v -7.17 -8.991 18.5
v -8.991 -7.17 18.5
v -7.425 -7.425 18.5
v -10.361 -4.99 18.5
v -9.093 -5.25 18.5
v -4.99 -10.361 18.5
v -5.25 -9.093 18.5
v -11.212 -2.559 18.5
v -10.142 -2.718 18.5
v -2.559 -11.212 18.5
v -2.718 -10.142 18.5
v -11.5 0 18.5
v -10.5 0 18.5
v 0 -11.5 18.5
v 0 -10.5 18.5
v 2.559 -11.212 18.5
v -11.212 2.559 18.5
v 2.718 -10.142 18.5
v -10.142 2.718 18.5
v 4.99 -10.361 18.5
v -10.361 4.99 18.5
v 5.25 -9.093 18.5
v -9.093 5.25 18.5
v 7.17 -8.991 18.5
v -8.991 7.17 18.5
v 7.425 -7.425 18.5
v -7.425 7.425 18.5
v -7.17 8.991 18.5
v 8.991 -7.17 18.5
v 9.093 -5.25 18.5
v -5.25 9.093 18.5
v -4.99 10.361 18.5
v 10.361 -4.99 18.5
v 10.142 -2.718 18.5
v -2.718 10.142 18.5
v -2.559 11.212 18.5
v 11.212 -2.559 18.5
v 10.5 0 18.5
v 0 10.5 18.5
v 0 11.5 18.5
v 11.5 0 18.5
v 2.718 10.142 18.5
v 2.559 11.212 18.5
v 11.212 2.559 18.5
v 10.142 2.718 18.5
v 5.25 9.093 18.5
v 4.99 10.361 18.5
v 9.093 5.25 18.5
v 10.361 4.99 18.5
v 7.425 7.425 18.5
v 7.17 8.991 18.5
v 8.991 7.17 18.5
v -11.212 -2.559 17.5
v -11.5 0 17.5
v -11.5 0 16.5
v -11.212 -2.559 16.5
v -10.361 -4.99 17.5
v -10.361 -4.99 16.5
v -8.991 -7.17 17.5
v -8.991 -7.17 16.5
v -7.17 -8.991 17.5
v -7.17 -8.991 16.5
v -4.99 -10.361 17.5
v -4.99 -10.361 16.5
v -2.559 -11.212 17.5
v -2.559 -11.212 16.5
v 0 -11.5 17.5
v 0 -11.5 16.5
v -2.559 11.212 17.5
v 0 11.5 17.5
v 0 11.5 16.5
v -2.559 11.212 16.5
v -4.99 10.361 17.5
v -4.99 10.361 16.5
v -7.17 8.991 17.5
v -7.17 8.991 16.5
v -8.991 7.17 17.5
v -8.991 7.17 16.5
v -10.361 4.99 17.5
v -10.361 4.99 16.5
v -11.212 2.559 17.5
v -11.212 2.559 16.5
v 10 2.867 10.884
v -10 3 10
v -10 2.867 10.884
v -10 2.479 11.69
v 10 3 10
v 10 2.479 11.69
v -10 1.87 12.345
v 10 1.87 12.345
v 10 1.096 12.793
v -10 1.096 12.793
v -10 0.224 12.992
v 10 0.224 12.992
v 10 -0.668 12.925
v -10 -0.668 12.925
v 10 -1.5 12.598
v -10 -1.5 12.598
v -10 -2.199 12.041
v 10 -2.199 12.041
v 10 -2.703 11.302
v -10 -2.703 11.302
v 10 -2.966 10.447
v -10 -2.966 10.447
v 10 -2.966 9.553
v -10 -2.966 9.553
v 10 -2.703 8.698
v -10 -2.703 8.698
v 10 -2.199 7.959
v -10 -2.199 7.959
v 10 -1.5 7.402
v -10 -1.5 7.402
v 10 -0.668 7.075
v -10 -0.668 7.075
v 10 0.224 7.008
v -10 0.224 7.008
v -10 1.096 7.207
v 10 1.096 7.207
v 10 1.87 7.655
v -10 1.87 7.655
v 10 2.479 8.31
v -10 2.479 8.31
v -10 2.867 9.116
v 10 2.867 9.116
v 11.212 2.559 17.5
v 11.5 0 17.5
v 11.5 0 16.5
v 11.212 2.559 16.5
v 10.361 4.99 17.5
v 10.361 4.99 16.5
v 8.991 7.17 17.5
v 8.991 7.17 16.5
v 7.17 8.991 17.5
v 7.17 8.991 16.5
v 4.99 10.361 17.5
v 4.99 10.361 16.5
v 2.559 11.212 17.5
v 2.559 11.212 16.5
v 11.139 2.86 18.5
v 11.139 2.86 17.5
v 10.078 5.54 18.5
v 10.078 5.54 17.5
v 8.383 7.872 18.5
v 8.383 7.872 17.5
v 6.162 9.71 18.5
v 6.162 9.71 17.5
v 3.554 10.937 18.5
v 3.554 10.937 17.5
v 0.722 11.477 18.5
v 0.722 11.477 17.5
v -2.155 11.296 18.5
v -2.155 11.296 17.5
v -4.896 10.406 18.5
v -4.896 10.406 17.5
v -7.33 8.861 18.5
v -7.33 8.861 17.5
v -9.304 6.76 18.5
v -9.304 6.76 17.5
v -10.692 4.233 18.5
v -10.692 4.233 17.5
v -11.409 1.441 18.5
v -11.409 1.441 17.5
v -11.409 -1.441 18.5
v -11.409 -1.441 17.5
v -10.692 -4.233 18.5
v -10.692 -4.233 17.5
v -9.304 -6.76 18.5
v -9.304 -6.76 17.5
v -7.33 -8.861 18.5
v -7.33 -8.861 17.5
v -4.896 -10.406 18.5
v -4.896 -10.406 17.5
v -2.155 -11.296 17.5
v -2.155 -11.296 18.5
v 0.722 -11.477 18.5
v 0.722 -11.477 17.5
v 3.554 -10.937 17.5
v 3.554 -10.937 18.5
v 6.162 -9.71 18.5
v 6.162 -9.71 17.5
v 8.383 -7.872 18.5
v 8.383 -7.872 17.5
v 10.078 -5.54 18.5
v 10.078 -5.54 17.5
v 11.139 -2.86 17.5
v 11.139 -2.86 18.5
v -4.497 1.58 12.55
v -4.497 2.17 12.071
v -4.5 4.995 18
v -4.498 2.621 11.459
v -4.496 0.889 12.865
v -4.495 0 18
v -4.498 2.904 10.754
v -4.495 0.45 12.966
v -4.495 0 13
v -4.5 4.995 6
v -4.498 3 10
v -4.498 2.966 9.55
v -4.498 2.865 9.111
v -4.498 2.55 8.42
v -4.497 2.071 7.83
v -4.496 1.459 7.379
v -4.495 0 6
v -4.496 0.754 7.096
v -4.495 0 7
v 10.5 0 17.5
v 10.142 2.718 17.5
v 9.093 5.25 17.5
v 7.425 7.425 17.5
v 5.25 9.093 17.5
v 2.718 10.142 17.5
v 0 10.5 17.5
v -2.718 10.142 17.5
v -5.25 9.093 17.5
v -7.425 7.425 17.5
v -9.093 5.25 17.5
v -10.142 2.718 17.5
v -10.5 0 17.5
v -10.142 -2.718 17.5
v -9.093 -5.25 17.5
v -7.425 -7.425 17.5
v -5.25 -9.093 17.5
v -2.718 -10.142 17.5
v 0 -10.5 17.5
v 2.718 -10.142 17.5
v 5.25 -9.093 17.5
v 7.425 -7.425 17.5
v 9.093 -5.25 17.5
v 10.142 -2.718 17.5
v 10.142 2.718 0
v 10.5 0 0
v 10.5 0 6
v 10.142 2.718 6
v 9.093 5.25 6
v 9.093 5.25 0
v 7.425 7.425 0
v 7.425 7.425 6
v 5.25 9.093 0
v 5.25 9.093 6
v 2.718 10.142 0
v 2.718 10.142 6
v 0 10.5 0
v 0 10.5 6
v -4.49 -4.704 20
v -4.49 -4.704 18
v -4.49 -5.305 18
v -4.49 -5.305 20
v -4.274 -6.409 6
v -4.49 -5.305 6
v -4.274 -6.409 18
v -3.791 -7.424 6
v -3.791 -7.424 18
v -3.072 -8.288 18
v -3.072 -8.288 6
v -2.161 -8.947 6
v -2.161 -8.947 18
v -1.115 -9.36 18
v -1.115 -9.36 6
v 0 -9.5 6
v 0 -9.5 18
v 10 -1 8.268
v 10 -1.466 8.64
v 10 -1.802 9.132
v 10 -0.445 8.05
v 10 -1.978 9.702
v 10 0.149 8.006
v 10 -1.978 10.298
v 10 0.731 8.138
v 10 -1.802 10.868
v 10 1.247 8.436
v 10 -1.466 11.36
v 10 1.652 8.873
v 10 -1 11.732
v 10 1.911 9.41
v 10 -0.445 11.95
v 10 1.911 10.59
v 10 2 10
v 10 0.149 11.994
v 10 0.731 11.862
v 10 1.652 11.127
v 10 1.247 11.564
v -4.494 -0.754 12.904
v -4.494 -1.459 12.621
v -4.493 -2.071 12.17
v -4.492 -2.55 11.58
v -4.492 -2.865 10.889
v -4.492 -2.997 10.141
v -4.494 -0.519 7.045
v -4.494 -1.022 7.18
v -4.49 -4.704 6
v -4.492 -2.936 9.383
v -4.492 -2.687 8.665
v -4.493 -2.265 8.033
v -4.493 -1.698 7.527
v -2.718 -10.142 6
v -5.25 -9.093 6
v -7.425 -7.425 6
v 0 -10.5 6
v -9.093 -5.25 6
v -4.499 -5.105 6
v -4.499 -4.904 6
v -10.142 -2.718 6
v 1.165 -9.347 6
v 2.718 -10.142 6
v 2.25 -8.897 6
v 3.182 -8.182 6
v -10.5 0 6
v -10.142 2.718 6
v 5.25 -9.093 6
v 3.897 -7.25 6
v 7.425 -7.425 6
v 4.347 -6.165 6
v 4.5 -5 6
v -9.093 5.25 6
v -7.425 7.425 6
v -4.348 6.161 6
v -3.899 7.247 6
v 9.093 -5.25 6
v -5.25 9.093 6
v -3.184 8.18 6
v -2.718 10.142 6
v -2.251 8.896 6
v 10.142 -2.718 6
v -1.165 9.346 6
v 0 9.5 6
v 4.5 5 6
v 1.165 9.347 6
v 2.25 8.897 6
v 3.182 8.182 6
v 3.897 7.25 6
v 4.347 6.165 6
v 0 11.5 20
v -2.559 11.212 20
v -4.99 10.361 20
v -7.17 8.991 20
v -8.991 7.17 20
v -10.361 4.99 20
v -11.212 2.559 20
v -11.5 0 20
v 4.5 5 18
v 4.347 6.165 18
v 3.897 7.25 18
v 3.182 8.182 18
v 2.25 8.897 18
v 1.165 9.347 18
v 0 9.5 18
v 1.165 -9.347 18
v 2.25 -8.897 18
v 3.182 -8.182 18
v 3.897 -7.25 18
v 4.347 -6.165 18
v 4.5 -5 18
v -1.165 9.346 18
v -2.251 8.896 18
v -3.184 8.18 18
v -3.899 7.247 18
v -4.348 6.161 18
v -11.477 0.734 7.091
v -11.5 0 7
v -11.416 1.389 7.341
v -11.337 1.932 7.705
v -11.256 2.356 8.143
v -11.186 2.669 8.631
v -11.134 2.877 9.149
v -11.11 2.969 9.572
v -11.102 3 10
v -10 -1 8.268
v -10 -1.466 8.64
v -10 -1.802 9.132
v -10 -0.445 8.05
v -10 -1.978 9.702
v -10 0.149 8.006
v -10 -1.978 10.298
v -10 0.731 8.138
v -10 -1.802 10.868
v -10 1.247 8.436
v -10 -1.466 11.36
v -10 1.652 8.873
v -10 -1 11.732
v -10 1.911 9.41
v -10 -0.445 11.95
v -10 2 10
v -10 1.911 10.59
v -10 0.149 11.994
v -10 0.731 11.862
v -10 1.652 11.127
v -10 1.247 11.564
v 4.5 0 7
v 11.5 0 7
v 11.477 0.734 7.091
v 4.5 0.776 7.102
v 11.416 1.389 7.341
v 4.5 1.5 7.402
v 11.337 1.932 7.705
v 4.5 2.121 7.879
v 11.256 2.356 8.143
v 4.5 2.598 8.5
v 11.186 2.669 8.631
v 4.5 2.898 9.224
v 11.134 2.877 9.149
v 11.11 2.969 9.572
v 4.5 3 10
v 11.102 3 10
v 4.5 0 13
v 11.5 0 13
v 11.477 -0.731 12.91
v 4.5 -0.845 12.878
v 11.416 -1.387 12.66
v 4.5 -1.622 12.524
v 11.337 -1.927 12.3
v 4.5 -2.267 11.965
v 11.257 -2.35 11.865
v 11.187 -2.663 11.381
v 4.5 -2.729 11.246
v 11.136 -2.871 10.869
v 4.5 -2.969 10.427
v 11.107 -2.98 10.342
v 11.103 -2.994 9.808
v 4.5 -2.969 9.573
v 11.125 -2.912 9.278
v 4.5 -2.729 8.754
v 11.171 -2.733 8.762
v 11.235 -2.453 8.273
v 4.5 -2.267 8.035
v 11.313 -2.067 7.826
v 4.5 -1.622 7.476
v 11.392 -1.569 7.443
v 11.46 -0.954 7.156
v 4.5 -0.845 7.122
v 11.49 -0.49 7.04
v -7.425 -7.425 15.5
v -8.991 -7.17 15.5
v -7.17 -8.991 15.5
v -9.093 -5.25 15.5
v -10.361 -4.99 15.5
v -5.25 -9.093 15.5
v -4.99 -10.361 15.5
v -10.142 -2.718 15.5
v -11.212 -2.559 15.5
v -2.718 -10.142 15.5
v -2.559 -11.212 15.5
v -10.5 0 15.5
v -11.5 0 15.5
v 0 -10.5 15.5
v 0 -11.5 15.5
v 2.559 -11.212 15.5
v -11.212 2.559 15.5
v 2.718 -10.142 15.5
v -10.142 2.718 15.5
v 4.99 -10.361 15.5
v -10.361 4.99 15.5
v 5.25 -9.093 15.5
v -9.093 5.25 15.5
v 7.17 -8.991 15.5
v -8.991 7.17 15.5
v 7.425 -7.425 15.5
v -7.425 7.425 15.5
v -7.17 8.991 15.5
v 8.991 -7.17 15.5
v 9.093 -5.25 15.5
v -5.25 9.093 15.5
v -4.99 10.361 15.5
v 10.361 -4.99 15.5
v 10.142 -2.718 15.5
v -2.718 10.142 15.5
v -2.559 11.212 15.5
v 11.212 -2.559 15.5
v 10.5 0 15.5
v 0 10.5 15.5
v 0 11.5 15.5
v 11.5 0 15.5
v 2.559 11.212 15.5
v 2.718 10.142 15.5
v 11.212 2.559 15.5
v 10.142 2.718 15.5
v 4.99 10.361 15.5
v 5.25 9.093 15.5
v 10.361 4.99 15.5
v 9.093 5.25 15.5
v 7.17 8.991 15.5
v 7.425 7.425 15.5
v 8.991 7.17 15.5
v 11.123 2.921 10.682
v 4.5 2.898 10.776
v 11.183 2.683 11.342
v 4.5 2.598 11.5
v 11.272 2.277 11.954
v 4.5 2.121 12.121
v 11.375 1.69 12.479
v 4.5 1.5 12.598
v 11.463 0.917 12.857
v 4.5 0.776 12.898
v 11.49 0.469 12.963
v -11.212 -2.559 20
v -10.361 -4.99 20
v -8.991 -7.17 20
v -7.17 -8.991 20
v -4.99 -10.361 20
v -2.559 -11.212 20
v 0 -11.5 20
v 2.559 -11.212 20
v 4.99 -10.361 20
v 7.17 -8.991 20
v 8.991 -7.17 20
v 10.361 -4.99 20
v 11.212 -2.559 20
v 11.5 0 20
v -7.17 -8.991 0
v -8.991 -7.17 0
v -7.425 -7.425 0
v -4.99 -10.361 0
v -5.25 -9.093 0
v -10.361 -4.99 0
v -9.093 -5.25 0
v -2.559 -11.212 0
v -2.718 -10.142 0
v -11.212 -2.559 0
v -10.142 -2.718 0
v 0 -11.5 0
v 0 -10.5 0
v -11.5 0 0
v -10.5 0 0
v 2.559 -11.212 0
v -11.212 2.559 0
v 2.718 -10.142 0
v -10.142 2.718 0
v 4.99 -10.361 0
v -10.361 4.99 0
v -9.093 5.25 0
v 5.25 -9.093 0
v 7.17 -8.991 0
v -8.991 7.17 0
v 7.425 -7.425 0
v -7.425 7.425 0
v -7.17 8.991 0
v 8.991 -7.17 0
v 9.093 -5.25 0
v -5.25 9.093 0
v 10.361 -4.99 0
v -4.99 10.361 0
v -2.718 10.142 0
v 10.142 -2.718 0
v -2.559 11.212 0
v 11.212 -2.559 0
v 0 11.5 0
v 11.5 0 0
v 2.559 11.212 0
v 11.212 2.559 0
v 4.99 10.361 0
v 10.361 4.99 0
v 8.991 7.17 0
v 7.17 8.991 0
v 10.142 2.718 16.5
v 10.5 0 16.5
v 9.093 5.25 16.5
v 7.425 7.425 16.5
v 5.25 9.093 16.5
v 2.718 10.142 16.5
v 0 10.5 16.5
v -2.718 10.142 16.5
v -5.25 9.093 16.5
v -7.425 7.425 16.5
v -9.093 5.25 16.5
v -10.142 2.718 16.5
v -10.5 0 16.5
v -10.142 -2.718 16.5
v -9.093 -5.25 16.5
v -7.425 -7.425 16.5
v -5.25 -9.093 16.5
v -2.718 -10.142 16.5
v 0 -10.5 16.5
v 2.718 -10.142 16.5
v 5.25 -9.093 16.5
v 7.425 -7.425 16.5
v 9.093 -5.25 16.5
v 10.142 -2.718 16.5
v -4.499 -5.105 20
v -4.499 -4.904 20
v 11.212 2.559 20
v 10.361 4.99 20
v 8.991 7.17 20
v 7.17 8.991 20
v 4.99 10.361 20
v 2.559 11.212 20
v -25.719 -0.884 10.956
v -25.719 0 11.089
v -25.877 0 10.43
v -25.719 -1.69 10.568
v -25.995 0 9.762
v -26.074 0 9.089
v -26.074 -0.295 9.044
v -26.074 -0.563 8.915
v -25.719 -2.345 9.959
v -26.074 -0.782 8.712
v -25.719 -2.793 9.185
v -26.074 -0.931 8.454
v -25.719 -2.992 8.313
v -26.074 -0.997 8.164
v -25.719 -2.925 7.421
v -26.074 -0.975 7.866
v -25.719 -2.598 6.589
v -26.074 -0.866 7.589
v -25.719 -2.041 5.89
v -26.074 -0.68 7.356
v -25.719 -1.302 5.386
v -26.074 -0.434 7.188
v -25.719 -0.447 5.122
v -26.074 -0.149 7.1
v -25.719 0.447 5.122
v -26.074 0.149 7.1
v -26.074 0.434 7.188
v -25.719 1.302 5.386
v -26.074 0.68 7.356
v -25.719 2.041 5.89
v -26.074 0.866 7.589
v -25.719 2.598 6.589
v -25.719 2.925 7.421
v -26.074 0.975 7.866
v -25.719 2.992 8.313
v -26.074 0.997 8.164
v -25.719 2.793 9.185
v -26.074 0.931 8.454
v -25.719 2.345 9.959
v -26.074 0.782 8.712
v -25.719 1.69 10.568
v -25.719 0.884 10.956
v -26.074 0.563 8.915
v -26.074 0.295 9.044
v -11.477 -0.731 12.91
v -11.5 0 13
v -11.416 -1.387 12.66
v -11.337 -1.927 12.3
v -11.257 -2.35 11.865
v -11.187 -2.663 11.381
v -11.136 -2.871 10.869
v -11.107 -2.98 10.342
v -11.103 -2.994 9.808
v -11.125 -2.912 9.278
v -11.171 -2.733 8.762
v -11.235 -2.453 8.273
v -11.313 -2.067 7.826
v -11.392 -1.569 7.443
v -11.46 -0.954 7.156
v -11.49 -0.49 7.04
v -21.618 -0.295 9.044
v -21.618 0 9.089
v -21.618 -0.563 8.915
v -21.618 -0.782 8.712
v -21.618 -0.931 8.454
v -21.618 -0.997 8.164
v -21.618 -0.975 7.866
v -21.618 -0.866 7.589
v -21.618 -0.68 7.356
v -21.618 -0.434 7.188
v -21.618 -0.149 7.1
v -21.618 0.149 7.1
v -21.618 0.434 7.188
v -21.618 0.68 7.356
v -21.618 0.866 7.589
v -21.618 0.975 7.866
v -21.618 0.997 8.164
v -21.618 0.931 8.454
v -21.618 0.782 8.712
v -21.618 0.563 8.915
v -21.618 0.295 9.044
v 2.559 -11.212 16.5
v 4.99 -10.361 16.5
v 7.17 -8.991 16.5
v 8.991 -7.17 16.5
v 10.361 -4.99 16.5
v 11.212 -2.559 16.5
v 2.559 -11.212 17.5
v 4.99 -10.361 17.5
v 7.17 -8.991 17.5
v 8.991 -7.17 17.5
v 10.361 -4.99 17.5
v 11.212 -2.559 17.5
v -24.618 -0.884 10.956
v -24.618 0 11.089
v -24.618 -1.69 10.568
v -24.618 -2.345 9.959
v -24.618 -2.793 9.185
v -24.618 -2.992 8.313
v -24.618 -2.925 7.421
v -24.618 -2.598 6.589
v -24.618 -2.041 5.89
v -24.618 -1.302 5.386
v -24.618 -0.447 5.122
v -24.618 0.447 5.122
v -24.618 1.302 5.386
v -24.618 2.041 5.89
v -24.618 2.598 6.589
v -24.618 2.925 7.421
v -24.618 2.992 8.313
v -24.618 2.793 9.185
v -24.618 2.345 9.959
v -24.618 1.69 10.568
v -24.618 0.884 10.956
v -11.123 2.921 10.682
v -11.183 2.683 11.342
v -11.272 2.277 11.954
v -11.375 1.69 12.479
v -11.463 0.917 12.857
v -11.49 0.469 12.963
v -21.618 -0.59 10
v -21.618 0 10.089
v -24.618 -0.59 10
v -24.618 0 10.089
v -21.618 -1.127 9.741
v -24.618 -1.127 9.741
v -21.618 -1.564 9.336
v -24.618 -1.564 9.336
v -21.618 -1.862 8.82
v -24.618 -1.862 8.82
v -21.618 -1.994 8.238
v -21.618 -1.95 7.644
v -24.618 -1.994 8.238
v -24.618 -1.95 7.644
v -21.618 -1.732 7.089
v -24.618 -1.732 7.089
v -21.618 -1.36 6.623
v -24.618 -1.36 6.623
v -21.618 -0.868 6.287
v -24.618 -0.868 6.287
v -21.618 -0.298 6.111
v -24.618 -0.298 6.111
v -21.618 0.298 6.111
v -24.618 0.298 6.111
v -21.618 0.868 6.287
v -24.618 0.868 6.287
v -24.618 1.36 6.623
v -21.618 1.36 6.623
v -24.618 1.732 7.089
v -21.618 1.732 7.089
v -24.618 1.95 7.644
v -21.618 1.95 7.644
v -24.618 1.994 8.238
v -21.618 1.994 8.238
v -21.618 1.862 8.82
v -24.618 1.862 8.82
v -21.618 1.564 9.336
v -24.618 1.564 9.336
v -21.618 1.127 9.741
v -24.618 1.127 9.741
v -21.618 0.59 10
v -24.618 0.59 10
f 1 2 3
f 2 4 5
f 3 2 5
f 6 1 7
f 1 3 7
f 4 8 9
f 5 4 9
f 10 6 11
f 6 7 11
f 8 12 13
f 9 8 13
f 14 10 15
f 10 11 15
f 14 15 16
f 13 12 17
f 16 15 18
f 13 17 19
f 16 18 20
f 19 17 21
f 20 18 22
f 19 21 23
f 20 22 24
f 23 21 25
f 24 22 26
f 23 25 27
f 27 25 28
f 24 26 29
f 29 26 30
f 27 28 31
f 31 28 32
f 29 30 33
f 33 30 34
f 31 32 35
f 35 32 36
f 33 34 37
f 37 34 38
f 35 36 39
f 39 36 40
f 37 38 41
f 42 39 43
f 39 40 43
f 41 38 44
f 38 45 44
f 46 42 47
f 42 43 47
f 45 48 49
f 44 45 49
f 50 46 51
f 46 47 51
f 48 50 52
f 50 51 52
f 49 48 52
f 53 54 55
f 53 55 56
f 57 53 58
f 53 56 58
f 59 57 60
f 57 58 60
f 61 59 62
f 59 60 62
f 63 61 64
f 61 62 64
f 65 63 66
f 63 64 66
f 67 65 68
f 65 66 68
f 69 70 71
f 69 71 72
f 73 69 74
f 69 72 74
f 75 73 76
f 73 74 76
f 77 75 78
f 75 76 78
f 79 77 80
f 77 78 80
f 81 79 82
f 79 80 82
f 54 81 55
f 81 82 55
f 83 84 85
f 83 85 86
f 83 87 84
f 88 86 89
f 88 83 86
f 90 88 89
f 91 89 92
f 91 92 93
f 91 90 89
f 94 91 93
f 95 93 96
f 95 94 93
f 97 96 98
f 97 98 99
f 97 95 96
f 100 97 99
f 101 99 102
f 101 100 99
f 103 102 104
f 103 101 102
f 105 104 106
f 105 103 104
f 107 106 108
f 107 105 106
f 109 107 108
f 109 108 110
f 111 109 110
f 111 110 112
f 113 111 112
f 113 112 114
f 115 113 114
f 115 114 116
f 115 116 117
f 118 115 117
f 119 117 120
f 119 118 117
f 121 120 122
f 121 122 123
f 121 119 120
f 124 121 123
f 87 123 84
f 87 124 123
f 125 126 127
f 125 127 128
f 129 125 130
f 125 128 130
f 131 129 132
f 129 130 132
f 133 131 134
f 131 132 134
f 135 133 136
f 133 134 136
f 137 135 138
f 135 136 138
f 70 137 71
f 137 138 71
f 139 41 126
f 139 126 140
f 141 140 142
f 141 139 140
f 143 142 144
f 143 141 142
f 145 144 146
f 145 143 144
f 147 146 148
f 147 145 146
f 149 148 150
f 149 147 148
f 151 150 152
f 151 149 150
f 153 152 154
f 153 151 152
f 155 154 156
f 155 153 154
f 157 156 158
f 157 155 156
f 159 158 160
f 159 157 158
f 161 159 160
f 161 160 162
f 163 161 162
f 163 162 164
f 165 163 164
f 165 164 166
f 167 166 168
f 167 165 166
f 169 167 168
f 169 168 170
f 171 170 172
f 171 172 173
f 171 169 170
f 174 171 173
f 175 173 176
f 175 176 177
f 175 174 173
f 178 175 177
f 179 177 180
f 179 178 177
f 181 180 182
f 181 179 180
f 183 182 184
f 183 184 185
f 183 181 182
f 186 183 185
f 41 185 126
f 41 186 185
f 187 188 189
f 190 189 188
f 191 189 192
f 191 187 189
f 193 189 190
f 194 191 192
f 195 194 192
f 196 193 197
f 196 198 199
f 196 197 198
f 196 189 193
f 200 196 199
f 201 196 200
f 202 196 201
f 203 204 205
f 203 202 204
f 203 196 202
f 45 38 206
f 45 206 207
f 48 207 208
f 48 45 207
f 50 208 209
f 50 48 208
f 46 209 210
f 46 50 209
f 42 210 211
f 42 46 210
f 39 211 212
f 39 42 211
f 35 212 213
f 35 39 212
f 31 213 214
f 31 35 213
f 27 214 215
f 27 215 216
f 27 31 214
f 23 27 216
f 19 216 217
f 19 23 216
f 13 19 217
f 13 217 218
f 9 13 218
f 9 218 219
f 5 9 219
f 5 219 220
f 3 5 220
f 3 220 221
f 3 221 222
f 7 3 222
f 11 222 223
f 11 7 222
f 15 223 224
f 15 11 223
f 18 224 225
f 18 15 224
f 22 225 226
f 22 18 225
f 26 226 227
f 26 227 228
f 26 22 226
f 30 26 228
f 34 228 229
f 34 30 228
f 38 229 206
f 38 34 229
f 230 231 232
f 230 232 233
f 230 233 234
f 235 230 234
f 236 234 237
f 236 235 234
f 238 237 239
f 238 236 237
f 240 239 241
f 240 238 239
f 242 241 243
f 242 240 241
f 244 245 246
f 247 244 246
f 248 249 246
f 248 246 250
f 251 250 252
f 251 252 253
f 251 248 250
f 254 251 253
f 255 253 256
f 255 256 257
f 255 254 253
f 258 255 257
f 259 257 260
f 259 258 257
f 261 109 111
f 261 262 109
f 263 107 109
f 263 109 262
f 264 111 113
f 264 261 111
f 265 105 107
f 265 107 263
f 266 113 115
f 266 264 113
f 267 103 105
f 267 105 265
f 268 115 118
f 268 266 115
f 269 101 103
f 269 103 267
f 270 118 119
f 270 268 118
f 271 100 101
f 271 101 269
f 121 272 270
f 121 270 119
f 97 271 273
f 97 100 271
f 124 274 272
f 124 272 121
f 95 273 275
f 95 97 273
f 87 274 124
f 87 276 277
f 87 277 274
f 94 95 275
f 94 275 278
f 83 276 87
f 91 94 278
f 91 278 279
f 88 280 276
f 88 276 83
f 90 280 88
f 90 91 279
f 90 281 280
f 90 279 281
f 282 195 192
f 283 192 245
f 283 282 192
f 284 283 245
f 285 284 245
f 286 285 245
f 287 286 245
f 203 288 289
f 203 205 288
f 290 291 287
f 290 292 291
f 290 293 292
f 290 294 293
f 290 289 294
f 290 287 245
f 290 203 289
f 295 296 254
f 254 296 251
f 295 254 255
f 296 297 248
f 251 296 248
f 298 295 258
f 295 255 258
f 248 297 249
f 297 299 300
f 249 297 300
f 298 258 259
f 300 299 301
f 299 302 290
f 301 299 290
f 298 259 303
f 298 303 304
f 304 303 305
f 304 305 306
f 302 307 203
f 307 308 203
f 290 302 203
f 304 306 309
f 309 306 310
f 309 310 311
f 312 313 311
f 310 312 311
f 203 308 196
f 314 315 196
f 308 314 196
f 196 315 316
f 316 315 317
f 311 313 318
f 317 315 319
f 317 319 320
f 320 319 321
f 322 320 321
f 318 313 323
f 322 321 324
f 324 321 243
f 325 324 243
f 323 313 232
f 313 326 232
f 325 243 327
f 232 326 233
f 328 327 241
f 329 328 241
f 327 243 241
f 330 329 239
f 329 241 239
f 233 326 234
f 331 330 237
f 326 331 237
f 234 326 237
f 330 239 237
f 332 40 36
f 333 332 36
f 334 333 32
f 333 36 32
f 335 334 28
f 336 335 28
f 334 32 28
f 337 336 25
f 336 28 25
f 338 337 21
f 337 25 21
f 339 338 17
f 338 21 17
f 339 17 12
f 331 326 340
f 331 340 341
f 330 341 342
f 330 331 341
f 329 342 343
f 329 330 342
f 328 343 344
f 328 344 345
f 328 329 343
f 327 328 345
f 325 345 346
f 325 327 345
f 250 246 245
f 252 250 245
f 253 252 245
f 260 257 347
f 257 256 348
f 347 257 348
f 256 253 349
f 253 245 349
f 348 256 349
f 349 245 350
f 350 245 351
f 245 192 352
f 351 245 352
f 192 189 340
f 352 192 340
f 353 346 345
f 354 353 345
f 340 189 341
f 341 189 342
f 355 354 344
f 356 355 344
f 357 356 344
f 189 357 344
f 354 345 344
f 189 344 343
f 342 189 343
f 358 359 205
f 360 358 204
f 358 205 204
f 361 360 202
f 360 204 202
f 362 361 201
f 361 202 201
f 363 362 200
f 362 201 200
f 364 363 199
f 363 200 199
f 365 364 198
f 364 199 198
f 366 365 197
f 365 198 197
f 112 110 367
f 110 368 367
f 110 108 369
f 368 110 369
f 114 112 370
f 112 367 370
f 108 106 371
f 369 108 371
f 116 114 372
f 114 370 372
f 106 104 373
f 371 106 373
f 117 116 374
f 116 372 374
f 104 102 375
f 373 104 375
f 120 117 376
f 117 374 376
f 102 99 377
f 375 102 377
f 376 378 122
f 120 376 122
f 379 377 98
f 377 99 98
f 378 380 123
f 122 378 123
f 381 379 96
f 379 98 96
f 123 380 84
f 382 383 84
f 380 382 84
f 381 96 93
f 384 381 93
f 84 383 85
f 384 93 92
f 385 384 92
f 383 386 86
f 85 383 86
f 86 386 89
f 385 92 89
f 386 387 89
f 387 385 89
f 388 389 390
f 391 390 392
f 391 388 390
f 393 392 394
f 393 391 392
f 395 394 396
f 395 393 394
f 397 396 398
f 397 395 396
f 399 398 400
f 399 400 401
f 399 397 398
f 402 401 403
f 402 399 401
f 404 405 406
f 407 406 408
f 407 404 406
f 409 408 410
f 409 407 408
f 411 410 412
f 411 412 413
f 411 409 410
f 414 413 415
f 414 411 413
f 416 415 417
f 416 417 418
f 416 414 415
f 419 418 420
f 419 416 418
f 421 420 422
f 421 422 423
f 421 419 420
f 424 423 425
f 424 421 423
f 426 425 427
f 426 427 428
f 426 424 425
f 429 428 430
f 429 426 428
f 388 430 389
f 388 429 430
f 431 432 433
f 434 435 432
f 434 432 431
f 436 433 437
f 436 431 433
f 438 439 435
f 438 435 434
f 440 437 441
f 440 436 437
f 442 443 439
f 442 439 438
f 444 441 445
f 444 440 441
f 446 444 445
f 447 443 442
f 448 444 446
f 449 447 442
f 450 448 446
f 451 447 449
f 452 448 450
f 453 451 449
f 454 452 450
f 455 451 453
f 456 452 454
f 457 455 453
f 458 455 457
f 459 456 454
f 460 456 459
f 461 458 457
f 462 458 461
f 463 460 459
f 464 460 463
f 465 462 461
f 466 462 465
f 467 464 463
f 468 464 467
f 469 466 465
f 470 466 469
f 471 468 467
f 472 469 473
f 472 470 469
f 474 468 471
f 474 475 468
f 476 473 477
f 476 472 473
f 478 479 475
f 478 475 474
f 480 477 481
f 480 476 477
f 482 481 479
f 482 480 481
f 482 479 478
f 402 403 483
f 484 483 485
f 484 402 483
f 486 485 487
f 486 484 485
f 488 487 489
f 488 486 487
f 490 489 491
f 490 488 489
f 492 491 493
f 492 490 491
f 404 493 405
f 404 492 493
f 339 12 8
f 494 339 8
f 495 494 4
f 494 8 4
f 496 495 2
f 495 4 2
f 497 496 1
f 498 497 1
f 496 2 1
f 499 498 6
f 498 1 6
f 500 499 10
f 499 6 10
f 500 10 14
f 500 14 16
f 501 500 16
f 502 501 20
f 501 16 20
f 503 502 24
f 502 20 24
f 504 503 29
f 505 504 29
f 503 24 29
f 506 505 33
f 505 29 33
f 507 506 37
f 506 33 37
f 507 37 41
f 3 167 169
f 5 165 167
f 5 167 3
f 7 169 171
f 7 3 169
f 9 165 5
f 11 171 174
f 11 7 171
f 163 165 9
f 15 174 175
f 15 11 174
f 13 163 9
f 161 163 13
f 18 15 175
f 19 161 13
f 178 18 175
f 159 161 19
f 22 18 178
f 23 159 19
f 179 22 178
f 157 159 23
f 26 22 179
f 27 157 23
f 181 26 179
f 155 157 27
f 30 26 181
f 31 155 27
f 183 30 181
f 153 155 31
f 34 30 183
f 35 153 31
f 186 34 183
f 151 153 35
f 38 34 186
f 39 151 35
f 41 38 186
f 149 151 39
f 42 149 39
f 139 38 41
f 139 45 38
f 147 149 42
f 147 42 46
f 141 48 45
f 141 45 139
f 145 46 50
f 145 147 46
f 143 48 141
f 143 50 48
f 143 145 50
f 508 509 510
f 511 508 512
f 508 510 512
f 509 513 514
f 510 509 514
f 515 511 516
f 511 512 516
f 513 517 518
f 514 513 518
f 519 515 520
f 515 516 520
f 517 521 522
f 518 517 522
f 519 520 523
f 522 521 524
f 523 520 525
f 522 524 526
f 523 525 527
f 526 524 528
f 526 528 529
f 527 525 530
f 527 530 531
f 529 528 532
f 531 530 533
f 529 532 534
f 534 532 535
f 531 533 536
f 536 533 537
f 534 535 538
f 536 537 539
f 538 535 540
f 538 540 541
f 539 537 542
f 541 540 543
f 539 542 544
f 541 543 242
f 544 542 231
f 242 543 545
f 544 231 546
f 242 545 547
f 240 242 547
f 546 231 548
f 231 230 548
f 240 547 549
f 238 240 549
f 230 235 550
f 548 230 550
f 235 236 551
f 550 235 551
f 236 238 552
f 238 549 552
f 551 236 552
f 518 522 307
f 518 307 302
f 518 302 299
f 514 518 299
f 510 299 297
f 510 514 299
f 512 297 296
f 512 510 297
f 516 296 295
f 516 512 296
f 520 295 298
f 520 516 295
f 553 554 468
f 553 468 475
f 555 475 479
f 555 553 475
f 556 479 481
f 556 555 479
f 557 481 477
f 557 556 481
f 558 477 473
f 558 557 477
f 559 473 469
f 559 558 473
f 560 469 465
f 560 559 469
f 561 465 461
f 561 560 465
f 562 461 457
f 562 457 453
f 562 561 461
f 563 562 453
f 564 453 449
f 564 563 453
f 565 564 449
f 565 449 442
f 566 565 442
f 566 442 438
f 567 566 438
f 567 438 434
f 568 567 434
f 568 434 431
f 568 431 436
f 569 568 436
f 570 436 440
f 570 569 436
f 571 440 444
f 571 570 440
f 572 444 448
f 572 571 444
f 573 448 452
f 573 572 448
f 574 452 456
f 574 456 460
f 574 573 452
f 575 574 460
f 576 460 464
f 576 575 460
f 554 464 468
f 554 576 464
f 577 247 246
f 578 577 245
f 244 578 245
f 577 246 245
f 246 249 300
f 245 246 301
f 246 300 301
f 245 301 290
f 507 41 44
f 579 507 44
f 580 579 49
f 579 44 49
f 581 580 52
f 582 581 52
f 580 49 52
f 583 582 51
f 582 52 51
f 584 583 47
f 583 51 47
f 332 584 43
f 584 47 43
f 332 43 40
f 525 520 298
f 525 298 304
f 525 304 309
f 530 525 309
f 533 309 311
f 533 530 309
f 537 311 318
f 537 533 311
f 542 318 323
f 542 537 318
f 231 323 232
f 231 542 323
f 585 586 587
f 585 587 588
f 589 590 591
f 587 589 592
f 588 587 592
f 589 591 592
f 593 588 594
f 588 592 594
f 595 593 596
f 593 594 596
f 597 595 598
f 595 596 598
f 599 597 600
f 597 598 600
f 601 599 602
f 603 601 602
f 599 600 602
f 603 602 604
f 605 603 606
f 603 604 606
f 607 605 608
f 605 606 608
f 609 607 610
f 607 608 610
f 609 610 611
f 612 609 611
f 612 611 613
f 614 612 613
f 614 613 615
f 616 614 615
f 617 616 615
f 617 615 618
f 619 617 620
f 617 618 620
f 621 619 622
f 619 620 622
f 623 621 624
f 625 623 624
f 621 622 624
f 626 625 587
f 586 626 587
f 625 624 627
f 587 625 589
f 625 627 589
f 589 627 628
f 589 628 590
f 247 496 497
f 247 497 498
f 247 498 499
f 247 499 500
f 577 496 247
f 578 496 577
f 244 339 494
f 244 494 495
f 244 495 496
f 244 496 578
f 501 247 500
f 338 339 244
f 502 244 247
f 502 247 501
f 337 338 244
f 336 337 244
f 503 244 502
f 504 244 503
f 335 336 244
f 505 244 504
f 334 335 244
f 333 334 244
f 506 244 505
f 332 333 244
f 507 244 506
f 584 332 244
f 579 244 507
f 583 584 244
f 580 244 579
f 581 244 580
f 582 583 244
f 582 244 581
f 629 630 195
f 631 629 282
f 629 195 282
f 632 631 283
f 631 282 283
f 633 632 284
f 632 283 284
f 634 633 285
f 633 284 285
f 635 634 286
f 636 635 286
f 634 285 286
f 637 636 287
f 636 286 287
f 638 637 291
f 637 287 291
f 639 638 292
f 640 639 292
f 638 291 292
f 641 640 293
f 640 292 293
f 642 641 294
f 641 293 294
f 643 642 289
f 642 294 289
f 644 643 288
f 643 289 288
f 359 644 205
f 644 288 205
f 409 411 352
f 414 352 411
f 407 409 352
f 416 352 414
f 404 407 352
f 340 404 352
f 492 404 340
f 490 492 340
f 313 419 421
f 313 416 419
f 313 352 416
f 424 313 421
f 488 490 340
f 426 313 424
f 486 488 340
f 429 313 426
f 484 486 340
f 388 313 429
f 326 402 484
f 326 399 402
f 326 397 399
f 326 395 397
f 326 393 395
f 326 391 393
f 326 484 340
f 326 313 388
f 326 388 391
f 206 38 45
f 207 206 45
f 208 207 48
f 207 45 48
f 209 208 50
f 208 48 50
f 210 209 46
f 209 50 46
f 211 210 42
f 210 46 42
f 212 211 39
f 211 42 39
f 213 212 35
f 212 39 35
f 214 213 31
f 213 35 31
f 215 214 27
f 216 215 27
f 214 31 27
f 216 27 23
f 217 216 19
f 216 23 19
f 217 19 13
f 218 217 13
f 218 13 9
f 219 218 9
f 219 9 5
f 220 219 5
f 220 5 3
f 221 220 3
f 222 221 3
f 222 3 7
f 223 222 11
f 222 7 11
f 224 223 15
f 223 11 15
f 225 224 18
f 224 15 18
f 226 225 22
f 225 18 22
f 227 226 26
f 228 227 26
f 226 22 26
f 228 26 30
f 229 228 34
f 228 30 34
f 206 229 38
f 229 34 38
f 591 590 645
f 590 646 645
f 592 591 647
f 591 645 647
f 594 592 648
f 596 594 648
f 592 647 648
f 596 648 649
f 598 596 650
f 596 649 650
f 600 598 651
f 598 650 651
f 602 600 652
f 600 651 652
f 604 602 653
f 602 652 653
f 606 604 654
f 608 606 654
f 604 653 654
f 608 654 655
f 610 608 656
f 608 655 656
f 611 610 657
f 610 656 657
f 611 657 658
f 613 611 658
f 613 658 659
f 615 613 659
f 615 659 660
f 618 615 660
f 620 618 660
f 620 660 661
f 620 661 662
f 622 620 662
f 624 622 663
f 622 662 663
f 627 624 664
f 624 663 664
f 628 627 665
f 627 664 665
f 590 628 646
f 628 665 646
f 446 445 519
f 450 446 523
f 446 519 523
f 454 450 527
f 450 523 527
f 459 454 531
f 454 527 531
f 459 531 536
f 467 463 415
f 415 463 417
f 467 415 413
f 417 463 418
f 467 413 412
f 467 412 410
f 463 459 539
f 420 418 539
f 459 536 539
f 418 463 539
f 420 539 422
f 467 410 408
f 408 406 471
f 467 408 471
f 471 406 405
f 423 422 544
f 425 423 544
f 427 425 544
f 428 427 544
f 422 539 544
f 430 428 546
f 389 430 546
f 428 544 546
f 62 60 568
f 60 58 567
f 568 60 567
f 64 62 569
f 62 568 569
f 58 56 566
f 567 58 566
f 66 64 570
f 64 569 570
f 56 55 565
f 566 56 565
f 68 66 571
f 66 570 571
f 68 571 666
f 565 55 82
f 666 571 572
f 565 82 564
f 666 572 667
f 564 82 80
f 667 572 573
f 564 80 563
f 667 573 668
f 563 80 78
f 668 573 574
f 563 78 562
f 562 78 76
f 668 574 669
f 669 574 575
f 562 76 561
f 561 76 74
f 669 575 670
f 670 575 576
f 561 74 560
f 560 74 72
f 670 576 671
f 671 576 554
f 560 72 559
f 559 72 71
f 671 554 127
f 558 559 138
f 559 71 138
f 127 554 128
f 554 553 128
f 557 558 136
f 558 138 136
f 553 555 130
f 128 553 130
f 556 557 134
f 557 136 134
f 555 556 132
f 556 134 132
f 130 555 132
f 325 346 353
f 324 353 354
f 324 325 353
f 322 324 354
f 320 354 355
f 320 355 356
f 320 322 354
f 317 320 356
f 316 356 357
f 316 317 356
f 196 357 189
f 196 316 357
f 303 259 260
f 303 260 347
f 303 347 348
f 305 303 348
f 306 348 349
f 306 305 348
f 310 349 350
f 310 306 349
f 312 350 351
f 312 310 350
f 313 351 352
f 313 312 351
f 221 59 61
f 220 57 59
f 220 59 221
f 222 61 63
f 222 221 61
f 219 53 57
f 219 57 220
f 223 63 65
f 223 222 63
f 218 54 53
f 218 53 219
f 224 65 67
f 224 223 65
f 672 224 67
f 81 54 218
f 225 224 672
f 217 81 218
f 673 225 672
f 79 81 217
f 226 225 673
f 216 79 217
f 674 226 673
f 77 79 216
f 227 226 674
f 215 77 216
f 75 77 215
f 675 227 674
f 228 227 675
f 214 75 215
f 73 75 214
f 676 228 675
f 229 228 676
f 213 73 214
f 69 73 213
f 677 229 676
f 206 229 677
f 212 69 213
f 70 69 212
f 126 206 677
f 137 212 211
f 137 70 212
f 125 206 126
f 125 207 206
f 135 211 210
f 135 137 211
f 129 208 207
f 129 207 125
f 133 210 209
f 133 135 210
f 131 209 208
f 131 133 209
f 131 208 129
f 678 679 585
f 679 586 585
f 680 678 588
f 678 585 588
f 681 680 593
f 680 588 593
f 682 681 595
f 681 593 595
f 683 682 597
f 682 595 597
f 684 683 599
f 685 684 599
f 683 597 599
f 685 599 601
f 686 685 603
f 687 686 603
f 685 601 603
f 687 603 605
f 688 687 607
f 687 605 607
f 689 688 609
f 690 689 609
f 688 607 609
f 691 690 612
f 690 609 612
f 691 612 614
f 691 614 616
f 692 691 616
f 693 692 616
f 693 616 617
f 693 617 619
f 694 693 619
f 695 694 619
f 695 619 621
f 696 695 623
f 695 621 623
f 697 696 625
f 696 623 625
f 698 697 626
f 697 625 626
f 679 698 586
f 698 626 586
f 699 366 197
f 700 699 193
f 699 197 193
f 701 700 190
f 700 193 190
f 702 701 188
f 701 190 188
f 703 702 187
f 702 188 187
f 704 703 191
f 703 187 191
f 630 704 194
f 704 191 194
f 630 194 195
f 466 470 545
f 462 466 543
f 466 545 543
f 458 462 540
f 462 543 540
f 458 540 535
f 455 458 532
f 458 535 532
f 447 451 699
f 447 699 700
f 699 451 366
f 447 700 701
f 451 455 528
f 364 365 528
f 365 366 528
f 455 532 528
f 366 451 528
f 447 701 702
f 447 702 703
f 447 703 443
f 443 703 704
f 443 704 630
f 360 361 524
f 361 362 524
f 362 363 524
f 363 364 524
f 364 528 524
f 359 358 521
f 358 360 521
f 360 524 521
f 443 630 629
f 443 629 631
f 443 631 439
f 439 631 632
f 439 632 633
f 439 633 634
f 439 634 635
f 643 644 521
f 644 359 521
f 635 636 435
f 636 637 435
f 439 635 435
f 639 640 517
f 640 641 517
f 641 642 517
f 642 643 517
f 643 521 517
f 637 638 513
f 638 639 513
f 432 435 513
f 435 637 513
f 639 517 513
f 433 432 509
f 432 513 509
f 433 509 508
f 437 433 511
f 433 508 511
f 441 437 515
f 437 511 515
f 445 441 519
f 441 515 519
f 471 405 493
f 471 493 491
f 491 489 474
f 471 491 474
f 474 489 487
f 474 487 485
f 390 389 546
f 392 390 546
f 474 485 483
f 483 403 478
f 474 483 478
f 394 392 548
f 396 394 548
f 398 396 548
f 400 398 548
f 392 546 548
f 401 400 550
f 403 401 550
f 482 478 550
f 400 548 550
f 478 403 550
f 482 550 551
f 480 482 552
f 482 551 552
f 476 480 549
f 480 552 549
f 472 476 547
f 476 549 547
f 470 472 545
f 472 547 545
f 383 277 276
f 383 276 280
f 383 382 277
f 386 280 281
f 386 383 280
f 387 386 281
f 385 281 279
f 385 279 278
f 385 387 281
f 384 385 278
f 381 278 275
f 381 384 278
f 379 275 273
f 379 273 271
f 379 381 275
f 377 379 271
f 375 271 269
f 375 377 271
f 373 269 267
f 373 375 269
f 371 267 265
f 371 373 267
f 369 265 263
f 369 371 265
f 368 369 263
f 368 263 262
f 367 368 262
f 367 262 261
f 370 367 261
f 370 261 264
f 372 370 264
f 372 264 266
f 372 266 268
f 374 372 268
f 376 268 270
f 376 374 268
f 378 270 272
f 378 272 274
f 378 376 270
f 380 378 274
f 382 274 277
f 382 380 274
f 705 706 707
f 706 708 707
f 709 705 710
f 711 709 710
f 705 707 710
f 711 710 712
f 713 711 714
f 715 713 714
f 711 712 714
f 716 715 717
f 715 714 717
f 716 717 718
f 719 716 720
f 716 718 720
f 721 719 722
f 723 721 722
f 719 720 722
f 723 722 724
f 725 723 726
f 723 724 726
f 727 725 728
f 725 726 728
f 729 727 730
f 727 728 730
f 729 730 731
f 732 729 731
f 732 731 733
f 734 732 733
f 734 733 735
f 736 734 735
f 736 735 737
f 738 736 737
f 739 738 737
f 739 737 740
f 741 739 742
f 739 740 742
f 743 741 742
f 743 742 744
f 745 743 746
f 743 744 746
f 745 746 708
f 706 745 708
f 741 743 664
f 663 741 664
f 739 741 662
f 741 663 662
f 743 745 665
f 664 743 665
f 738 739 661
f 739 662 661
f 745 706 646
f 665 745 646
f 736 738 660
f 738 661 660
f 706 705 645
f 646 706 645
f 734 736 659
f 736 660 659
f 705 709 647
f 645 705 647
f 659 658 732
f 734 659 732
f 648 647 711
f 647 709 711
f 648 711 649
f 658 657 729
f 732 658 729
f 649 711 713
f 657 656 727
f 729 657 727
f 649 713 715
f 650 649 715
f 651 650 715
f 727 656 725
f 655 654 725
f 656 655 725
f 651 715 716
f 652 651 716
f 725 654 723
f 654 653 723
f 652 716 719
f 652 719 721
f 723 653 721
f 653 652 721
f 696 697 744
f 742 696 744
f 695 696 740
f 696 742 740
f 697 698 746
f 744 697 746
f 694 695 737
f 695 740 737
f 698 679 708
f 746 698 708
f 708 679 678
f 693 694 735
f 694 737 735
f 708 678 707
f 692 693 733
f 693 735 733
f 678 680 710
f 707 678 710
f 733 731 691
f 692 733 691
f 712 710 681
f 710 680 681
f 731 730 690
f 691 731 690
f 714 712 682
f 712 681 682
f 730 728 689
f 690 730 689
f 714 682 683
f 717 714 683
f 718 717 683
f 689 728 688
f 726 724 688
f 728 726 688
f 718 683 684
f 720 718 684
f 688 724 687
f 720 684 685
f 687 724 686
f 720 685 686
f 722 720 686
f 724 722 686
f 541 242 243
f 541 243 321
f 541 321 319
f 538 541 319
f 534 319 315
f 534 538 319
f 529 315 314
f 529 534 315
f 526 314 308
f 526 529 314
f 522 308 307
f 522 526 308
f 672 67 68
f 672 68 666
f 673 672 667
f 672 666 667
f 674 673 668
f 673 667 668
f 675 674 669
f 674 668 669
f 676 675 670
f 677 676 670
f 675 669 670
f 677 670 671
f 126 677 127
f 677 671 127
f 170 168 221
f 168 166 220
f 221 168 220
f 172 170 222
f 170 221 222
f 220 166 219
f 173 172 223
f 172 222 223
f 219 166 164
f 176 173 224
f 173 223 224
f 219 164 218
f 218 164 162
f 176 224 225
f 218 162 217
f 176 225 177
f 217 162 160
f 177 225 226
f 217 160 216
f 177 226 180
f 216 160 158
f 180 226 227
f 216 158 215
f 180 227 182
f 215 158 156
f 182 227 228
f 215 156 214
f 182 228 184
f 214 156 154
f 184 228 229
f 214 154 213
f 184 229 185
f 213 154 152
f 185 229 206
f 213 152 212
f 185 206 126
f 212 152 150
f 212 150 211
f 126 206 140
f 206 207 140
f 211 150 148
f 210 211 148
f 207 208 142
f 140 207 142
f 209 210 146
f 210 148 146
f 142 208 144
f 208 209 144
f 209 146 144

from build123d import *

# Parameters (mm, degrees)
F1_DEPTH  = 20
F2_DEPTH  = 18
F3_DEPTH  = 6
F5_DEPTH  = 12.5
F7_R      = 11.5
F7_R_2    = 10.5
F8_DEPTH  = 1
F10_R     = 11.5
F10_R_2   = 10.5
F11_DEPTH = 1
F12_DEPTH = 1
F13_R     = 3
F13_R_2   = 2
F14_DEPTH = 10


with BuildPart() as f1:
    # F0 (on Top) → F1 (new body)
    with BuildSketch(Plane.XY):
        with BuildLine():
            Line((0, 10.5), (0, 11.5))
            ThreePointArc((0, 11.5), (-8.1317279836, 8.1317279836), (-11.5, 0))
            Line((-11.5, 0), (-10.5, 0))
            ThreePointArc((-10.5, 0), (-7.4246212025, 7.4246212025), (0, 10.5))
        make_face()
        with BuildLine():
            Line((0, 9.5), (0, 10.5))
            ThreePointArc((0, 10.5), (-7.4246212025, 7.4246212025), (-10.5, 0))
            Line((-10.5, 0), (-4.4949756738, 0))
            Line((-4.4949756738, 0), (-4.499997726, 4.9954760621))
            ThreePointArc((-4.499997726, 4.9954760621), (-3.1835795671, 8.1803806596), (0, 9.5))
        make_face()
        with BuildLine():
            Line((-4.4949756738, 0), (0, 0))
            Line((0, 0), (0, 0.5))
            ThreePointArc((0, 0.5), (-3.1803806596, 1.8164204329), (-4.499997726, 4.9954760621))
            Line((-4.499997726, 4.9954760621), (-4.4949756738, 0))
        make_face()
        with BuildLine():
            Line((0, 0.5), (0, 9.5))
            ThreePointArc((0, 9.5), (-3.1835795671, 8.1803806596), (-4.499997726, 4.9954760621))
            ThreePointArc((-4.499997726, 4.9954760621), (-3.1803806596, 1.8164204329), (0, 0.5))
        make_face()
        with BuildLine():
            ThreePointArc((4.5, 5), (3.1819805153, 8.1819805153), (0, 9.5))
            Line((0, 9.5), (0, 0.5))
            ThreePointArc((0, 0.5), (3.1819805153, 1.8180194847), (4.5, 5))
        make_face()
        with BuildLine():
            Line((10.5, 0), (11.5, 0))
            ThreePointArc((11.5, 0), (8.1317279836, 8.1317279836), (0, 11.5))
            Line((0, 11.5), (0, 10.5))
            ThreePointArc((0, 10.5), (7.4246212025, 7.4246212025), (10.5, 0))
        make_face()
        with BuildLine():
            Line((4.5, -5), (4.5, 0))
            Line((4.5, 0), (0, 0))
            Line((0, 0), (0, -0.5))
            ThreePointArc((0, -0.5), (3.1819805153, -1.8180194847), (4.5, -5))
        make_face()
        with BuildLine():
            ThreePointArc((0, -10.5), (7.4246212025, -7.4246212025), (10.5, 0))
            Line((10.5, 0), (4.5, 0))
            Line((4.5, 0), (4.5, -5))
            ThreePointArc((4.5, -5), (3.1819805153, -8.1819805153), (0, -9.5))
            Line((0, -9.5), (0, -10.5))
        make_face()
        with BuildLine():
            ThreePointArc((-11.5, 0), (-8.1317279836, -8.1317279836), (0, -11.5))
            Line((0, -11.5), (0, -10.5))
            ThreePointArc((0, -10.5), (-7.4246212025, -7.4246212025), (-10.5, 0))
            Line((-10.5, 0), (-11.5, 0))
        make_face()
        with BuildLine():
            ThreePointArc((-10.5, 0), (-7.4246212025, -7.4246212025), (0, -10.5))
            Line((0, -10.5), (0, -9.5))
            ThreePointArc((0, -9.5), (-3.0722026892, -8.28809529), (-4.4896423078, -5.3051425051))
            ThreePointArc((-4.4896423078, -5.3051425051), (-4.499997726, -5.0045239379), (-4.4902467638, -4.7038851573))
            Line((-4.4902467638, -4.7038851573), (-4.4949756738, 0))
            Line((-4.4949756738, 0), (-10.5, 0))
        make_face()
        with BuildLine():
            Line((0, -0.5), (0, 0))
            Line((0, 0), (-4.4949756738, 0))
            Line((-4.4949756738, 0), (-4.4902467638, -4.7038851573))
            ThreePointArc((-4.4902467638, -4.7038851573), (-3.0755067231, -1.7149949169), (0, -0.5))
        make_face()
        with BuildLine():
            ThreePointArc((-4.4896423078, -5.3051425051), (-3.0722026892, -8.28809529), (0, -9.5))
            Line((0, -9.5), (0, -0.5))
            ThreePointArc((0, -0.5), (-3.0755067231, -1.7149949169), (-4.4902467638, -4.7038851573))
            Line((-4.4902467638, -4.7038851573), (-4.4896423078, -5.3051425051))
        make_face()
        with BuildLine():
            Line((0, -0.5), (0, -9.5))
            ThreePointArc((0, -9.5), (3.1819805153, -8.1819805153), (4.5, -5))
            ThreePointArc((4.5, -5), (3.1819805153, -1.8180194847), (0, -0.5))
        make_face()
        with BuildLine():
            ThreePointArc((0, -11.5), (8.1317279836, -8.1317279836), (11.5, 0))
            Line((11.5, 0), (10.5, 0))
            ThreePointArc((10.5, 0), (7.4246212025, -7.4246212025), (0, -10.5))
            Line((0, -10.5), (0, -11.5))
        make_face()
        with BuildLine():
            Line((4.5, 0), (10.5, 0))
            ThreePointArc((10.5, 0), (7.4246212025, 7.4246212025), (0, 10.5))
            Line((0, 10.5), (0, 9.5))
            ThreePointArc((0, 9.5), (3.1819805153, 8.1819805153), (4.5, 5))
            Line((4.5, 5), (4.5, 0))
        make_face()
        with BuildLine():
            Line((0, 0), (4.5, 0))
            Line((4.5, 0), (4.5, 5))
            ThreePointArc((4.5, 5), (3.1819805153, 1.8180194847), (0, 0.5))
            Line((0, 0.5), (0, 0))
        make_face()
    extrude(amount=F1_DEPTH)

    # F0 (on Top) → F2 (cut)
    with BuildSketch(Plane.XY):
        with BuildLine():
            ThreePointArc((-4.4896423078, -5.3051425051), (-3.0722026892, -8.28809529), (0, -9.5))
            Line((0, -9.5), (0, -0.5))
            ThreePointArc((0, -0.5), (-3.0755067231, -1.7149949169), (-4.4902467638, -4.7038851573))
            Line((-4.4902467638, -4.7038851573), (-4.4896423078, -5.3051425051))
        make_face()
        with BuildLine():
            Line((0, -0.5), (0, -9.5))
            ThreePointArc((0, -9.5), (3.1819805153, -8.1819805153), (4.5, -5))
            ThreePointArc((4.5, -5), (3.1819805153, -1.8180194847), (0, -0.5))
        make_face()
        with BuildLine():
            Line((4.5, -5), (4.5, 0))
            Line((4.5, 0), (0, 0))
            Line((0, 0), (0, -0.5))
            ThreePointArc((0, -0.5), (3.1819805153, -1.8180194847), (4.5, -5))
        make_face()
        with BuildLine():
            Line((0, 0), (4.5, 0))
            Line((4.5, 0), (4.5, 5))
            ThreePointArc((4.5, 5), (3.1819805153, 1.8180194847), (0, 0.5))
            Line((0, 0.5), (0, 0))
        make_face()
        with BuildLine():
            ThreePointArc((4.5, 5), (3.1819805153, 8.1819805153), (0, 9.5))
            Line((0, 9.5), (0, 0.5))
            ThreePointArc((0, 0.5), (3.1819805153, 1.8180194847), (4.5, 5))
        make_face()
        with BuildLine():
            Line((0, 0.5), (0, 9.5))
            ThreePointArc((0, 9.5), (-3.1835795671, 8.1803806596), (-4.499997726, 4.9954760621))
            ThreePointArc((-4.499997726, 4.9954760621), (-3.1803806596, 1.8164204329), (0, 0.5))
        make_face()
        with BuildLine():
            Line((0, -0.5), (0, 0))
            Line((0, 0), (-4.4949756738, 0))
            Line((-4.4949756738, 0), (-4.4902467638, -4.7038851573))
            ThreePointArc((-4.4902467638, -4.7038851573), (-3.0755067231, -1.7149949169), (0, -0.5))
        make_face()
        with BuildLine():
            Line((-4.4949756738, 0), (0, 0))
            Line((0, 0), (0, 0.5))
            ThreePointArc((0, 0.5), (-3.1803806596, 1.8164204329), (-4.499997726, 4.9954760621))
            Line((-4.499997726, 4.9954760621), (-4.4949756738, 0))
        make_face()
    extrude(amount=F2_DEPTH, mode=Mode.SUBTRACT)

    # F0 (on Top) → F3 (cut)
    with BuildSketch(Plane.XY):
        with BuildLine():
            ThreePointArc((-10.5, 0), (-7.4246212025, -7.4246212025), (0, -10.5))
            Line((0, -10.5), (0, -9.5))
            ThreePointArc((0, -9.5), (-3.0722026892, -8.28809529), (-4.4896423078, -5.3051425051))
            ThreePointArc((-4.4896423078, -5.3051425051), (-4.499997726, -5.0045239379), (-4.4902467638, -4.7038851573))
            Line((-4.4902467638, -4.7038851573), (-4.4949756738, 0))
            Line((-4.4949756738, 0), (-10.5, 0))
        make_face()
        with BuildLine():
            ThreePointArc((0, -10.5), (7.4246212025, -7.4246212025), (10.5, 0))
            Line((10.5, 0), (4.5, 0))
            Line((4.5, 0), (4.5, -5))
            ThreePointArc((4.5, -5), (3.1819805153, -8.1819805153), (0, -9.5))
            Line((0, -9.5), (0, -10.5))
        make_face()
        with BuildLine():
            Line((4.5, 0), (10.5, 0))
            ThreePointArc((10.5, 0), (7.4246212025, 7.4246212025), (0, 10.5))
            Line((0, 10.5), (0, 9.5))
            ThreePointArc((0, 9.5), (3.1819805153, 8.1819805153), (4.5, 5))
            Line((4.5, 5), (4.5, 0))
        make_face()
        with BuildLine():
            Line((0, 9.5), (0, 10.5))
            ThreePointArc((0, 10.5), (-7.4246212025, 7.4246212025), (-10.5, 0))
            Line((-10.5, 0), (-4.4949756738, 0))
            Line((-4.4949756738, 0), (-4.499997726, 4.9954760621))
            ThreePointArc((-4.499997726, 4.9954760621), (-3.1835795671, 8.1803806596), (0, 9.5))
        make_face()
    extrude(amount=F3_DEPTH, mode=Mode.SUBTRACT)

    # F4 (on Right) → F5 (cut, symmetric)
    with BuildSketch(Plane.YZ):
        with BuildLine():
            ThreePointArc((3, 10), (2.1213203436, 12.1213203436), (0, 13))
            Line((0, 13), (0, 7))
            ThreePointArc((0, 7), (2.1213203436, 7.8786796564), (3, 10))
        make_face()
        with BuildLine():
            Line((0, 7), (0, 13))
            ThreePointArc((0, 13), (-3, 10), (0, 7))
        make_face()
    extrude(amount=F5_DEPTH, both=True, mode=Mode.SUBTRACT)

    # F7 (on offset) → F8 (cut)
    with BuildSketch(Plane.XY.offset(18.5)):
        Circle(F7_R)
        Circle(F7_R_2, mode=Mode.SUBTRACT)
    extrude(amount=-F8_DEPTH, mode=Mode.SUBTRACT)

    # F10 (on offset) → F11 (cut)
    with BuildSketch(Plane.XY.offset(16.5)):
        Circle(F10_R)
        Circle(F10_R_2, mode=Mode.SUBTRACT)
    extrude(amount=-F11_DEPTH, mode=Mode.SUBTRACT)


with BuildPart() as f12:
    # F7 (on offset) → F12 (new body)
    with BuildSketch(Plane.XY.offset(18.5)):
        Circle(F7_R)
        Circle(F7_R_2, mode=Mode.SUBTRACT)
    extrude(amount=-F12_DEPTH)


with BuildPart() as f14:
    # F13 (on face) → F14 (new body, symmetric)
    with BuildSketch(Plane.YZ):
        with Locations((0, 10)):
            Circle(F13_R)
        with Locations((0, 10)):
            Circle(F13_R_2, mode=Mode.SUBTRACT)
    extrude(amount=F14_DEPTH, both=True)


with BuildPart() as f16:
    # F15 (on Front) → F16 (revolve)
    with BuildSketch(Plane.XZ):
        with BuildLine():
            Line((-26.0740043477, 9.0888299271), (-21.6175651103, 9.0888299271))
            Line((-21.6175651103, 9.0888299271), (-21.6175651103, 10.0888299271))
            Line((-21.6175651103, 10.0888299271), (-24.6175651103, 10.0888299271))
            Line((-24.6175651103, 10.0888299271), (-24.6175651103, 11.0888299271))
            Line((-24.6175651103, 11.0888299271), (-25.7193667659, 11.0888299271))
            ThreePointArc((-25.7193667659, 11.0888299271), (-25.940928482, 10.0966750291), (-26.0740043477, 9.0888299271))
        make_face()
    revolve(axis=Axis((-20.3675651103, 0, 8.0888299271), (1, 0, 0)))


solid = Compound([f1.part, f12.part, f14.part, f16.part])
